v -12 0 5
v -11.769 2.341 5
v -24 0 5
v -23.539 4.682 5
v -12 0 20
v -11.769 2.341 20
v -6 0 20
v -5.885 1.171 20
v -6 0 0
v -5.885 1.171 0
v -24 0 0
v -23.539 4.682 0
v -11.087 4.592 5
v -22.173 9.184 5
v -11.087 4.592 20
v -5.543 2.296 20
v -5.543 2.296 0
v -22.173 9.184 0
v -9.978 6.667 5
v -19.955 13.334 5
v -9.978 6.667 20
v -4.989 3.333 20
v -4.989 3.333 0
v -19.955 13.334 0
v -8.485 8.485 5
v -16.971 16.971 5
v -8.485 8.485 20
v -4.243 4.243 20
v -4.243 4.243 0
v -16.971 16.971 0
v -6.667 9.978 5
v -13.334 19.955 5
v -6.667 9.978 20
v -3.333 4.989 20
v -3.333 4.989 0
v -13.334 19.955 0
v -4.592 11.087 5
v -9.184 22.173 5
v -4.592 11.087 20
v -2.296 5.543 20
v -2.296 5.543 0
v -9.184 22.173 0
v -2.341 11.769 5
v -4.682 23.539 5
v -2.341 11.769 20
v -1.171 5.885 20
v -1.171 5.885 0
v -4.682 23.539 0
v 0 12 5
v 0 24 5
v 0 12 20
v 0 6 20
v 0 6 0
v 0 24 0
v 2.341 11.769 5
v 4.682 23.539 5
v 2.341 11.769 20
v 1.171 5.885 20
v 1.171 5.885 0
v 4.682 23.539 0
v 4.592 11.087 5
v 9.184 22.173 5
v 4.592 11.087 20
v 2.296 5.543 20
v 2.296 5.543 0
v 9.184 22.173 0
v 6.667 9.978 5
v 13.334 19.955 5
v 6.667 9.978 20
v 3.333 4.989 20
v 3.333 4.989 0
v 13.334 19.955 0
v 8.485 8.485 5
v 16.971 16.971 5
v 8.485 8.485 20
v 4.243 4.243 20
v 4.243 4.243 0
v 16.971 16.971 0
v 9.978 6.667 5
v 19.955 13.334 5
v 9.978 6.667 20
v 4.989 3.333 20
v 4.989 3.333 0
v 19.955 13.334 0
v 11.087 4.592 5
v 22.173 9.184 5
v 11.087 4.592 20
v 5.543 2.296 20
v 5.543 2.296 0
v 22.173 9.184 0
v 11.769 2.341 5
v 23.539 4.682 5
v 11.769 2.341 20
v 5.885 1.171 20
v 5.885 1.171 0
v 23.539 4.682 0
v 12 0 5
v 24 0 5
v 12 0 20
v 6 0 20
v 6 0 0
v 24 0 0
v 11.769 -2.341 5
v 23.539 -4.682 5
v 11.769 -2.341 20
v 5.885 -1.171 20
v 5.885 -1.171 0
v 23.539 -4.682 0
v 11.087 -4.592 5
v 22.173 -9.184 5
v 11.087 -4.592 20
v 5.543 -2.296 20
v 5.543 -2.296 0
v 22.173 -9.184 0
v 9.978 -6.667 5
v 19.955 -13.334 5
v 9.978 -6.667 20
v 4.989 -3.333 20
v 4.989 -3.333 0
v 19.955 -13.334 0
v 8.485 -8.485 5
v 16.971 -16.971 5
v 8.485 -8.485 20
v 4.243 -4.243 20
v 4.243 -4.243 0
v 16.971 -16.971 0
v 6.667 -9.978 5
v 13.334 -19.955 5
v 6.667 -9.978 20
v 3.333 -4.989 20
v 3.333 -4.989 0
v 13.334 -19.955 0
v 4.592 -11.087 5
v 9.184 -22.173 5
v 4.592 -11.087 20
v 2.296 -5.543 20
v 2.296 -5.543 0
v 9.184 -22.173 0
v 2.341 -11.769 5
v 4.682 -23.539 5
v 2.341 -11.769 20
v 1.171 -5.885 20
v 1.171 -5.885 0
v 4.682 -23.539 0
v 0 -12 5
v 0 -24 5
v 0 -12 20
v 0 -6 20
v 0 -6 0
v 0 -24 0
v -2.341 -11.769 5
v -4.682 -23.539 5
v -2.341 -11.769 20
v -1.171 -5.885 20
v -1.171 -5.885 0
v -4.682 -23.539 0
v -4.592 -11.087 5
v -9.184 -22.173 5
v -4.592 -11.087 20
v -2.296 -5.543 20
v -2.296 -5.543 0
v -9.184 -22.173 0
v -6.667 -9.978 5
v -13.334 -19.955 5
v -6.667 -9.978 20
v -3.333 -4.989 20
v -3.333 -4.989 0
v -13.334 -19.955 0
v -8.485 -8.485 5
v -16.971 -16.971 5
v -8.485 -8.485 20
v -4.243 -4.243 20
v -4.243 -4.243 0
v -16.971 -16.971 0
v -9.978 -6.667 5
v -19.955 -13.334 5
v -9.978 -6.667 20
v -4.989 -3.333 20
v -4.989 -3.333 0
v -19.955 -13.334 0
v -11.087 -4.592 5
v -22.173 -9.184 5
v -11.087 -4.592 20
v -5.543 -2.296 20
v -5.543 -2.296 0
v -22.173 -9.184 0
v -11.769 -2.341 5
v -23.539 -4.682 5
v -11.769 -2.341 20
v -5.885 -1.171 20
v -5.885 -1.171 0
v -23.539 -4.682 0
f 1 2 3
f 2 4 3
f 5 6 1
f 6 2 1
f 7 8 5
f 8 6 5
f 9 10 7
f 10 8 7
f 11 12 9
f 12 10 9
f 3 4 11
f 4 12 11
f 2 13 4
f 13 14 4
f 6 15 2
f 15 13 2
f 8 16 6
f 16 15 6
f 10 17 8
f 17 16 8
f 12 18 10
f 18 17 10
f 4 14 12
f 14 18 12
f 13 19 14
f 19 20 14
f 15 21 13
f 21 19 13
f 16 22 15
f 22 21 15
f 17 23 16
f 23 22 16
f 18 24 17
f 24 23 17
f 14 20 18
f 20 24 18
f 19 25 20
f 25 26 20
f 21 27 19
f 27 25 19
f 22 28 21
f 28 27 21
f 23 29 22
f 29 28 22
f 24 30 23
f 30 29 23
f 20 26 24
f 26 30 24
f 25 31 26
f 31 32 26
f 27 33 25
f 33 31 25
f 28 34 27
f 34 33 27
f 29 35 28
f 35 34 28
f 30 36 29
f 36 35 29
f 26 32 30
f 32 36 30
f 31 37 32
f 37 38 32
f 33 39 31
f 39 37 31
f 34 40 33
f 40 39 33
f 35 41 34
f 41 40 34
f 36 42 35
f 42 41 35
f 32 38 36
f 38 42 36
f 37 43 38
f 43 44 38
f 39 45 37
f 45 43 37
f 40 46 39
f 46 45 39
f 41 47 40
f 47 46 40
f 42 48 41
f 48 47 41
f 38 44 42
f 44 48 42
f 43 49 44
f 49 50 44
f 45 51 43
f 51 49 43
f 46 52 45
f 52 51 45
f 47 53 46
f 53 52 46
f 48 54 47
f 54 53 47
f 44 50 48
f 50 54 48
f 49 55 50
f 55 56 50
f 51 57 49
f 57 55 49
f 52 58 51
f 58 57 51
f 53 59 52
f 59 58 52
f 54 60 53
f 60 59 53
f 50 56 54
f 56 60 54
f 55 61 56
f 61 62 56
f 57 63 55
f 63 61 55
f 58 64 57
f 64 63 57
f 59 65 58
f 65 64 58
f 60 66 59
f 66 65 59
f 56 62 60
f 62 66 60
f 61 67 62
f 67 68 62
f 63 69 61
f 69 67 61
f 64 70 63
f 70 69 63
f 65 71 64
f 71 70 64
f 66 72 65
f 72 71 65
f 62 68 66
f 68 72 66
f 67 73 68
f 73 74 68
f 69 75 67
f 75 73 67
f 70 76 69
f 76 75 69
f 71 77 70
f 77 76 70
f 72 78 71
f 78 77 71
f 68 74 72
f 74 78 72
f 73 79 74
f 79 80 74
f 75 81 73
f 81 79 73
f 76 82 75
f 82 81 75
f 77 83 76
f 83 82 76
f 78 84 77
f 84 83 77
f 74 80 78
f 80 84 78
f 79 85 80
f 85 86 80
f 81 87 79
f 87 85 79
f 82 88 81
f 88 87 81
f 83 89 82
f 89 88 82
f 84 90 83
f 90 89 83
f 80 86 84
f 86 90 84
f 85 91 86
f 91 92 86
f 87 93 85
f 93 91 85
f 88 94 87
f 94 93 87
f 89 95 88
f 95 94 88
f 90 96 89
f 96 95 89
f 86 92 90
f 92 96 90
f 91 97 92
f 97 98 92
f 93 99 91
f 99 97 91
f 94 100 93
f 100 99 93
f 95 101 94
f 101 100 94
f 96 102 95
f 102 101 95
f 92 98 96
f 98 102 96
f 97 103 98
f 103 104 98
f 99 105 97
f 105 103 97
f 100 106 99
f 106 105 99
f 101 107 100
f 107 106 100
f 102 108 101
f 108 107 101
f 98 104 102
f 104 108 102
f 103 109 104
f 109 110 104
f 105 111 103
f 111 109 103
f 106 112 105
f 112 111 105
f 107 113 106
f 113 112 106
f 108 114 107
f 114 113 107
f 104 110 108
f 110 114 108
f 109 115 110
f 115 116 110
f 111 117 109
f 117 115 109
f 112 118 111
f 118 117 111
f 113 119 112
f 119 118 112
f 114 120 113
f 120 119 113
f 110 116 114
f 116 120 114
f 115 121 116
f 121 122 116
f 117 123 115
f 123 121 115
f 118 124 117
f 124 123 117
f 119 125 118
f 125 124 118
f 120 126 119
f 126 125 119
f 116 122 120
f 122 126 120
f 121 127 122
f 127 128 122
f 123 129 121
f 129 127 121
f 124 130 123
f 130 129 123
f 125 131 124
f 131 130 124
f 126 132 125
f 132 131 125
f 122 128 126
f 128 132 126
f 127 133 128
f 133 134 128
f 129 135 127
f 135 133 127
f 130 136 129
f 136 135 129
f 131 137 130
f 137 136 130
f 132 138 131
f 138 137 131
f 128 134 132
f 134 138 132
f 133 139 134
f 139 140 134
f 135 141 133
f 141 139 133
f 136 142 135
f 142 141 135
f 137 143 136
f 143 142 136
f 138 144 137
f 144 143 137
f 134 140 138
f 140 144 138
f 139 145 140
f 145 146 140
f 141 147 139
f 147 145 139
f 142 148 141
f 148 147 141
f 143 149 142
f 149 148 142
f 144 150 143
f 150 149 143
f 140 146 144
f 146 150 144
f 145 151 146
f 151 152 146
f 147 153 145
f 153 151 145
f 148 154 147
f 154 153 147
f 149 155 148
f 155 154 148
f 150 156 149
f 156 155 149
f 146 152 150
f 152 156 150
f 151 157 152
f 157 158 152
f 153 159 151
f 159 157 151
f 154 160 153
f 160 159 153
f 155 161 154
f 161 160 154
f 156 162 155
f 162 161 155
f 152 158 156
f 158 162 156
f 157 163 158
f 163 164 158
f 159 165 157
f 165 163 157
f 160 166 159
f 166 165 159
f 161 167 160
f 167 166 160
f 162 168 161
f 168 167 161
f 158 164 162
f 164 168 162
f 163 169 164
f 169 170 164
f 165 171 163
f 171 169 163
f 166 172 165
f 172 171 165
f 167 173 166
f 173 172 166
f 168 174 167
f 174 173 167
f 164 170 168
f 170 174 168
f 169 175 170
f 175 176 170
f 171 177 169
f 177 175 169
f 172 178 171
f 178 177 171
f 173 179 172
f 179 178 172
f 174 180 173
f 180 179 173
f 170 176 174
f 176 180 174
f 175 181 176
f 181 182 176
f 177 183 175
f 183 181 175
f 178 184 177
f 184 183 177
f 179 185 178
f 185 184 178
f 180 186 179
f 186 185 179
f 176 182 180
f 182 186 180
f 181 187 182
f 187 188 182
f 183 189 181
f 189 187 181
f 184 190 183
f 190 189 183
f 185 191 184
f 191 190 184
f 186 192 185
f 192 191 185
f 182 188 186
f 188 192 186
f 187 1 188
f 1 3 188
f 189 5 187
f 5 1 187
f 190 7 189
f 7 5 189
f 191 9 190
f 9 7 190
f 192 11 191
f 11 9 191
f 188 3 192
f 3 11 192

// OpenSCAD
$fn = 32;

// ----------------------------------------------------------------------
// Revolved part: flanged bushing R24
// ----------------------------------------------------------------------

// --- parameters (mm) ---
bore_r = 6;               // bore radius
flange_r = 24;            // flange radius
flange_h = 5;             // flange thickness
sleeve_r = 12;            // sleeve radius
total_h = 20;             // overall height
revolve_angle = 360;      // revolve sweep, degrees

bore_d = 2 * bore_r;
flange_d = 2 * flange_r;
sleeve_d = 2 * sleeve_r;

profile = [[6, 0], [24, 0], [24, 5], [12, 5], [12, 20], [6, 20]];  // primary outline, 6 points, counter clockwise

// --- the one profile operation ---
rotate_extrude(angle = revolve_angle) polygon(points = profile);
